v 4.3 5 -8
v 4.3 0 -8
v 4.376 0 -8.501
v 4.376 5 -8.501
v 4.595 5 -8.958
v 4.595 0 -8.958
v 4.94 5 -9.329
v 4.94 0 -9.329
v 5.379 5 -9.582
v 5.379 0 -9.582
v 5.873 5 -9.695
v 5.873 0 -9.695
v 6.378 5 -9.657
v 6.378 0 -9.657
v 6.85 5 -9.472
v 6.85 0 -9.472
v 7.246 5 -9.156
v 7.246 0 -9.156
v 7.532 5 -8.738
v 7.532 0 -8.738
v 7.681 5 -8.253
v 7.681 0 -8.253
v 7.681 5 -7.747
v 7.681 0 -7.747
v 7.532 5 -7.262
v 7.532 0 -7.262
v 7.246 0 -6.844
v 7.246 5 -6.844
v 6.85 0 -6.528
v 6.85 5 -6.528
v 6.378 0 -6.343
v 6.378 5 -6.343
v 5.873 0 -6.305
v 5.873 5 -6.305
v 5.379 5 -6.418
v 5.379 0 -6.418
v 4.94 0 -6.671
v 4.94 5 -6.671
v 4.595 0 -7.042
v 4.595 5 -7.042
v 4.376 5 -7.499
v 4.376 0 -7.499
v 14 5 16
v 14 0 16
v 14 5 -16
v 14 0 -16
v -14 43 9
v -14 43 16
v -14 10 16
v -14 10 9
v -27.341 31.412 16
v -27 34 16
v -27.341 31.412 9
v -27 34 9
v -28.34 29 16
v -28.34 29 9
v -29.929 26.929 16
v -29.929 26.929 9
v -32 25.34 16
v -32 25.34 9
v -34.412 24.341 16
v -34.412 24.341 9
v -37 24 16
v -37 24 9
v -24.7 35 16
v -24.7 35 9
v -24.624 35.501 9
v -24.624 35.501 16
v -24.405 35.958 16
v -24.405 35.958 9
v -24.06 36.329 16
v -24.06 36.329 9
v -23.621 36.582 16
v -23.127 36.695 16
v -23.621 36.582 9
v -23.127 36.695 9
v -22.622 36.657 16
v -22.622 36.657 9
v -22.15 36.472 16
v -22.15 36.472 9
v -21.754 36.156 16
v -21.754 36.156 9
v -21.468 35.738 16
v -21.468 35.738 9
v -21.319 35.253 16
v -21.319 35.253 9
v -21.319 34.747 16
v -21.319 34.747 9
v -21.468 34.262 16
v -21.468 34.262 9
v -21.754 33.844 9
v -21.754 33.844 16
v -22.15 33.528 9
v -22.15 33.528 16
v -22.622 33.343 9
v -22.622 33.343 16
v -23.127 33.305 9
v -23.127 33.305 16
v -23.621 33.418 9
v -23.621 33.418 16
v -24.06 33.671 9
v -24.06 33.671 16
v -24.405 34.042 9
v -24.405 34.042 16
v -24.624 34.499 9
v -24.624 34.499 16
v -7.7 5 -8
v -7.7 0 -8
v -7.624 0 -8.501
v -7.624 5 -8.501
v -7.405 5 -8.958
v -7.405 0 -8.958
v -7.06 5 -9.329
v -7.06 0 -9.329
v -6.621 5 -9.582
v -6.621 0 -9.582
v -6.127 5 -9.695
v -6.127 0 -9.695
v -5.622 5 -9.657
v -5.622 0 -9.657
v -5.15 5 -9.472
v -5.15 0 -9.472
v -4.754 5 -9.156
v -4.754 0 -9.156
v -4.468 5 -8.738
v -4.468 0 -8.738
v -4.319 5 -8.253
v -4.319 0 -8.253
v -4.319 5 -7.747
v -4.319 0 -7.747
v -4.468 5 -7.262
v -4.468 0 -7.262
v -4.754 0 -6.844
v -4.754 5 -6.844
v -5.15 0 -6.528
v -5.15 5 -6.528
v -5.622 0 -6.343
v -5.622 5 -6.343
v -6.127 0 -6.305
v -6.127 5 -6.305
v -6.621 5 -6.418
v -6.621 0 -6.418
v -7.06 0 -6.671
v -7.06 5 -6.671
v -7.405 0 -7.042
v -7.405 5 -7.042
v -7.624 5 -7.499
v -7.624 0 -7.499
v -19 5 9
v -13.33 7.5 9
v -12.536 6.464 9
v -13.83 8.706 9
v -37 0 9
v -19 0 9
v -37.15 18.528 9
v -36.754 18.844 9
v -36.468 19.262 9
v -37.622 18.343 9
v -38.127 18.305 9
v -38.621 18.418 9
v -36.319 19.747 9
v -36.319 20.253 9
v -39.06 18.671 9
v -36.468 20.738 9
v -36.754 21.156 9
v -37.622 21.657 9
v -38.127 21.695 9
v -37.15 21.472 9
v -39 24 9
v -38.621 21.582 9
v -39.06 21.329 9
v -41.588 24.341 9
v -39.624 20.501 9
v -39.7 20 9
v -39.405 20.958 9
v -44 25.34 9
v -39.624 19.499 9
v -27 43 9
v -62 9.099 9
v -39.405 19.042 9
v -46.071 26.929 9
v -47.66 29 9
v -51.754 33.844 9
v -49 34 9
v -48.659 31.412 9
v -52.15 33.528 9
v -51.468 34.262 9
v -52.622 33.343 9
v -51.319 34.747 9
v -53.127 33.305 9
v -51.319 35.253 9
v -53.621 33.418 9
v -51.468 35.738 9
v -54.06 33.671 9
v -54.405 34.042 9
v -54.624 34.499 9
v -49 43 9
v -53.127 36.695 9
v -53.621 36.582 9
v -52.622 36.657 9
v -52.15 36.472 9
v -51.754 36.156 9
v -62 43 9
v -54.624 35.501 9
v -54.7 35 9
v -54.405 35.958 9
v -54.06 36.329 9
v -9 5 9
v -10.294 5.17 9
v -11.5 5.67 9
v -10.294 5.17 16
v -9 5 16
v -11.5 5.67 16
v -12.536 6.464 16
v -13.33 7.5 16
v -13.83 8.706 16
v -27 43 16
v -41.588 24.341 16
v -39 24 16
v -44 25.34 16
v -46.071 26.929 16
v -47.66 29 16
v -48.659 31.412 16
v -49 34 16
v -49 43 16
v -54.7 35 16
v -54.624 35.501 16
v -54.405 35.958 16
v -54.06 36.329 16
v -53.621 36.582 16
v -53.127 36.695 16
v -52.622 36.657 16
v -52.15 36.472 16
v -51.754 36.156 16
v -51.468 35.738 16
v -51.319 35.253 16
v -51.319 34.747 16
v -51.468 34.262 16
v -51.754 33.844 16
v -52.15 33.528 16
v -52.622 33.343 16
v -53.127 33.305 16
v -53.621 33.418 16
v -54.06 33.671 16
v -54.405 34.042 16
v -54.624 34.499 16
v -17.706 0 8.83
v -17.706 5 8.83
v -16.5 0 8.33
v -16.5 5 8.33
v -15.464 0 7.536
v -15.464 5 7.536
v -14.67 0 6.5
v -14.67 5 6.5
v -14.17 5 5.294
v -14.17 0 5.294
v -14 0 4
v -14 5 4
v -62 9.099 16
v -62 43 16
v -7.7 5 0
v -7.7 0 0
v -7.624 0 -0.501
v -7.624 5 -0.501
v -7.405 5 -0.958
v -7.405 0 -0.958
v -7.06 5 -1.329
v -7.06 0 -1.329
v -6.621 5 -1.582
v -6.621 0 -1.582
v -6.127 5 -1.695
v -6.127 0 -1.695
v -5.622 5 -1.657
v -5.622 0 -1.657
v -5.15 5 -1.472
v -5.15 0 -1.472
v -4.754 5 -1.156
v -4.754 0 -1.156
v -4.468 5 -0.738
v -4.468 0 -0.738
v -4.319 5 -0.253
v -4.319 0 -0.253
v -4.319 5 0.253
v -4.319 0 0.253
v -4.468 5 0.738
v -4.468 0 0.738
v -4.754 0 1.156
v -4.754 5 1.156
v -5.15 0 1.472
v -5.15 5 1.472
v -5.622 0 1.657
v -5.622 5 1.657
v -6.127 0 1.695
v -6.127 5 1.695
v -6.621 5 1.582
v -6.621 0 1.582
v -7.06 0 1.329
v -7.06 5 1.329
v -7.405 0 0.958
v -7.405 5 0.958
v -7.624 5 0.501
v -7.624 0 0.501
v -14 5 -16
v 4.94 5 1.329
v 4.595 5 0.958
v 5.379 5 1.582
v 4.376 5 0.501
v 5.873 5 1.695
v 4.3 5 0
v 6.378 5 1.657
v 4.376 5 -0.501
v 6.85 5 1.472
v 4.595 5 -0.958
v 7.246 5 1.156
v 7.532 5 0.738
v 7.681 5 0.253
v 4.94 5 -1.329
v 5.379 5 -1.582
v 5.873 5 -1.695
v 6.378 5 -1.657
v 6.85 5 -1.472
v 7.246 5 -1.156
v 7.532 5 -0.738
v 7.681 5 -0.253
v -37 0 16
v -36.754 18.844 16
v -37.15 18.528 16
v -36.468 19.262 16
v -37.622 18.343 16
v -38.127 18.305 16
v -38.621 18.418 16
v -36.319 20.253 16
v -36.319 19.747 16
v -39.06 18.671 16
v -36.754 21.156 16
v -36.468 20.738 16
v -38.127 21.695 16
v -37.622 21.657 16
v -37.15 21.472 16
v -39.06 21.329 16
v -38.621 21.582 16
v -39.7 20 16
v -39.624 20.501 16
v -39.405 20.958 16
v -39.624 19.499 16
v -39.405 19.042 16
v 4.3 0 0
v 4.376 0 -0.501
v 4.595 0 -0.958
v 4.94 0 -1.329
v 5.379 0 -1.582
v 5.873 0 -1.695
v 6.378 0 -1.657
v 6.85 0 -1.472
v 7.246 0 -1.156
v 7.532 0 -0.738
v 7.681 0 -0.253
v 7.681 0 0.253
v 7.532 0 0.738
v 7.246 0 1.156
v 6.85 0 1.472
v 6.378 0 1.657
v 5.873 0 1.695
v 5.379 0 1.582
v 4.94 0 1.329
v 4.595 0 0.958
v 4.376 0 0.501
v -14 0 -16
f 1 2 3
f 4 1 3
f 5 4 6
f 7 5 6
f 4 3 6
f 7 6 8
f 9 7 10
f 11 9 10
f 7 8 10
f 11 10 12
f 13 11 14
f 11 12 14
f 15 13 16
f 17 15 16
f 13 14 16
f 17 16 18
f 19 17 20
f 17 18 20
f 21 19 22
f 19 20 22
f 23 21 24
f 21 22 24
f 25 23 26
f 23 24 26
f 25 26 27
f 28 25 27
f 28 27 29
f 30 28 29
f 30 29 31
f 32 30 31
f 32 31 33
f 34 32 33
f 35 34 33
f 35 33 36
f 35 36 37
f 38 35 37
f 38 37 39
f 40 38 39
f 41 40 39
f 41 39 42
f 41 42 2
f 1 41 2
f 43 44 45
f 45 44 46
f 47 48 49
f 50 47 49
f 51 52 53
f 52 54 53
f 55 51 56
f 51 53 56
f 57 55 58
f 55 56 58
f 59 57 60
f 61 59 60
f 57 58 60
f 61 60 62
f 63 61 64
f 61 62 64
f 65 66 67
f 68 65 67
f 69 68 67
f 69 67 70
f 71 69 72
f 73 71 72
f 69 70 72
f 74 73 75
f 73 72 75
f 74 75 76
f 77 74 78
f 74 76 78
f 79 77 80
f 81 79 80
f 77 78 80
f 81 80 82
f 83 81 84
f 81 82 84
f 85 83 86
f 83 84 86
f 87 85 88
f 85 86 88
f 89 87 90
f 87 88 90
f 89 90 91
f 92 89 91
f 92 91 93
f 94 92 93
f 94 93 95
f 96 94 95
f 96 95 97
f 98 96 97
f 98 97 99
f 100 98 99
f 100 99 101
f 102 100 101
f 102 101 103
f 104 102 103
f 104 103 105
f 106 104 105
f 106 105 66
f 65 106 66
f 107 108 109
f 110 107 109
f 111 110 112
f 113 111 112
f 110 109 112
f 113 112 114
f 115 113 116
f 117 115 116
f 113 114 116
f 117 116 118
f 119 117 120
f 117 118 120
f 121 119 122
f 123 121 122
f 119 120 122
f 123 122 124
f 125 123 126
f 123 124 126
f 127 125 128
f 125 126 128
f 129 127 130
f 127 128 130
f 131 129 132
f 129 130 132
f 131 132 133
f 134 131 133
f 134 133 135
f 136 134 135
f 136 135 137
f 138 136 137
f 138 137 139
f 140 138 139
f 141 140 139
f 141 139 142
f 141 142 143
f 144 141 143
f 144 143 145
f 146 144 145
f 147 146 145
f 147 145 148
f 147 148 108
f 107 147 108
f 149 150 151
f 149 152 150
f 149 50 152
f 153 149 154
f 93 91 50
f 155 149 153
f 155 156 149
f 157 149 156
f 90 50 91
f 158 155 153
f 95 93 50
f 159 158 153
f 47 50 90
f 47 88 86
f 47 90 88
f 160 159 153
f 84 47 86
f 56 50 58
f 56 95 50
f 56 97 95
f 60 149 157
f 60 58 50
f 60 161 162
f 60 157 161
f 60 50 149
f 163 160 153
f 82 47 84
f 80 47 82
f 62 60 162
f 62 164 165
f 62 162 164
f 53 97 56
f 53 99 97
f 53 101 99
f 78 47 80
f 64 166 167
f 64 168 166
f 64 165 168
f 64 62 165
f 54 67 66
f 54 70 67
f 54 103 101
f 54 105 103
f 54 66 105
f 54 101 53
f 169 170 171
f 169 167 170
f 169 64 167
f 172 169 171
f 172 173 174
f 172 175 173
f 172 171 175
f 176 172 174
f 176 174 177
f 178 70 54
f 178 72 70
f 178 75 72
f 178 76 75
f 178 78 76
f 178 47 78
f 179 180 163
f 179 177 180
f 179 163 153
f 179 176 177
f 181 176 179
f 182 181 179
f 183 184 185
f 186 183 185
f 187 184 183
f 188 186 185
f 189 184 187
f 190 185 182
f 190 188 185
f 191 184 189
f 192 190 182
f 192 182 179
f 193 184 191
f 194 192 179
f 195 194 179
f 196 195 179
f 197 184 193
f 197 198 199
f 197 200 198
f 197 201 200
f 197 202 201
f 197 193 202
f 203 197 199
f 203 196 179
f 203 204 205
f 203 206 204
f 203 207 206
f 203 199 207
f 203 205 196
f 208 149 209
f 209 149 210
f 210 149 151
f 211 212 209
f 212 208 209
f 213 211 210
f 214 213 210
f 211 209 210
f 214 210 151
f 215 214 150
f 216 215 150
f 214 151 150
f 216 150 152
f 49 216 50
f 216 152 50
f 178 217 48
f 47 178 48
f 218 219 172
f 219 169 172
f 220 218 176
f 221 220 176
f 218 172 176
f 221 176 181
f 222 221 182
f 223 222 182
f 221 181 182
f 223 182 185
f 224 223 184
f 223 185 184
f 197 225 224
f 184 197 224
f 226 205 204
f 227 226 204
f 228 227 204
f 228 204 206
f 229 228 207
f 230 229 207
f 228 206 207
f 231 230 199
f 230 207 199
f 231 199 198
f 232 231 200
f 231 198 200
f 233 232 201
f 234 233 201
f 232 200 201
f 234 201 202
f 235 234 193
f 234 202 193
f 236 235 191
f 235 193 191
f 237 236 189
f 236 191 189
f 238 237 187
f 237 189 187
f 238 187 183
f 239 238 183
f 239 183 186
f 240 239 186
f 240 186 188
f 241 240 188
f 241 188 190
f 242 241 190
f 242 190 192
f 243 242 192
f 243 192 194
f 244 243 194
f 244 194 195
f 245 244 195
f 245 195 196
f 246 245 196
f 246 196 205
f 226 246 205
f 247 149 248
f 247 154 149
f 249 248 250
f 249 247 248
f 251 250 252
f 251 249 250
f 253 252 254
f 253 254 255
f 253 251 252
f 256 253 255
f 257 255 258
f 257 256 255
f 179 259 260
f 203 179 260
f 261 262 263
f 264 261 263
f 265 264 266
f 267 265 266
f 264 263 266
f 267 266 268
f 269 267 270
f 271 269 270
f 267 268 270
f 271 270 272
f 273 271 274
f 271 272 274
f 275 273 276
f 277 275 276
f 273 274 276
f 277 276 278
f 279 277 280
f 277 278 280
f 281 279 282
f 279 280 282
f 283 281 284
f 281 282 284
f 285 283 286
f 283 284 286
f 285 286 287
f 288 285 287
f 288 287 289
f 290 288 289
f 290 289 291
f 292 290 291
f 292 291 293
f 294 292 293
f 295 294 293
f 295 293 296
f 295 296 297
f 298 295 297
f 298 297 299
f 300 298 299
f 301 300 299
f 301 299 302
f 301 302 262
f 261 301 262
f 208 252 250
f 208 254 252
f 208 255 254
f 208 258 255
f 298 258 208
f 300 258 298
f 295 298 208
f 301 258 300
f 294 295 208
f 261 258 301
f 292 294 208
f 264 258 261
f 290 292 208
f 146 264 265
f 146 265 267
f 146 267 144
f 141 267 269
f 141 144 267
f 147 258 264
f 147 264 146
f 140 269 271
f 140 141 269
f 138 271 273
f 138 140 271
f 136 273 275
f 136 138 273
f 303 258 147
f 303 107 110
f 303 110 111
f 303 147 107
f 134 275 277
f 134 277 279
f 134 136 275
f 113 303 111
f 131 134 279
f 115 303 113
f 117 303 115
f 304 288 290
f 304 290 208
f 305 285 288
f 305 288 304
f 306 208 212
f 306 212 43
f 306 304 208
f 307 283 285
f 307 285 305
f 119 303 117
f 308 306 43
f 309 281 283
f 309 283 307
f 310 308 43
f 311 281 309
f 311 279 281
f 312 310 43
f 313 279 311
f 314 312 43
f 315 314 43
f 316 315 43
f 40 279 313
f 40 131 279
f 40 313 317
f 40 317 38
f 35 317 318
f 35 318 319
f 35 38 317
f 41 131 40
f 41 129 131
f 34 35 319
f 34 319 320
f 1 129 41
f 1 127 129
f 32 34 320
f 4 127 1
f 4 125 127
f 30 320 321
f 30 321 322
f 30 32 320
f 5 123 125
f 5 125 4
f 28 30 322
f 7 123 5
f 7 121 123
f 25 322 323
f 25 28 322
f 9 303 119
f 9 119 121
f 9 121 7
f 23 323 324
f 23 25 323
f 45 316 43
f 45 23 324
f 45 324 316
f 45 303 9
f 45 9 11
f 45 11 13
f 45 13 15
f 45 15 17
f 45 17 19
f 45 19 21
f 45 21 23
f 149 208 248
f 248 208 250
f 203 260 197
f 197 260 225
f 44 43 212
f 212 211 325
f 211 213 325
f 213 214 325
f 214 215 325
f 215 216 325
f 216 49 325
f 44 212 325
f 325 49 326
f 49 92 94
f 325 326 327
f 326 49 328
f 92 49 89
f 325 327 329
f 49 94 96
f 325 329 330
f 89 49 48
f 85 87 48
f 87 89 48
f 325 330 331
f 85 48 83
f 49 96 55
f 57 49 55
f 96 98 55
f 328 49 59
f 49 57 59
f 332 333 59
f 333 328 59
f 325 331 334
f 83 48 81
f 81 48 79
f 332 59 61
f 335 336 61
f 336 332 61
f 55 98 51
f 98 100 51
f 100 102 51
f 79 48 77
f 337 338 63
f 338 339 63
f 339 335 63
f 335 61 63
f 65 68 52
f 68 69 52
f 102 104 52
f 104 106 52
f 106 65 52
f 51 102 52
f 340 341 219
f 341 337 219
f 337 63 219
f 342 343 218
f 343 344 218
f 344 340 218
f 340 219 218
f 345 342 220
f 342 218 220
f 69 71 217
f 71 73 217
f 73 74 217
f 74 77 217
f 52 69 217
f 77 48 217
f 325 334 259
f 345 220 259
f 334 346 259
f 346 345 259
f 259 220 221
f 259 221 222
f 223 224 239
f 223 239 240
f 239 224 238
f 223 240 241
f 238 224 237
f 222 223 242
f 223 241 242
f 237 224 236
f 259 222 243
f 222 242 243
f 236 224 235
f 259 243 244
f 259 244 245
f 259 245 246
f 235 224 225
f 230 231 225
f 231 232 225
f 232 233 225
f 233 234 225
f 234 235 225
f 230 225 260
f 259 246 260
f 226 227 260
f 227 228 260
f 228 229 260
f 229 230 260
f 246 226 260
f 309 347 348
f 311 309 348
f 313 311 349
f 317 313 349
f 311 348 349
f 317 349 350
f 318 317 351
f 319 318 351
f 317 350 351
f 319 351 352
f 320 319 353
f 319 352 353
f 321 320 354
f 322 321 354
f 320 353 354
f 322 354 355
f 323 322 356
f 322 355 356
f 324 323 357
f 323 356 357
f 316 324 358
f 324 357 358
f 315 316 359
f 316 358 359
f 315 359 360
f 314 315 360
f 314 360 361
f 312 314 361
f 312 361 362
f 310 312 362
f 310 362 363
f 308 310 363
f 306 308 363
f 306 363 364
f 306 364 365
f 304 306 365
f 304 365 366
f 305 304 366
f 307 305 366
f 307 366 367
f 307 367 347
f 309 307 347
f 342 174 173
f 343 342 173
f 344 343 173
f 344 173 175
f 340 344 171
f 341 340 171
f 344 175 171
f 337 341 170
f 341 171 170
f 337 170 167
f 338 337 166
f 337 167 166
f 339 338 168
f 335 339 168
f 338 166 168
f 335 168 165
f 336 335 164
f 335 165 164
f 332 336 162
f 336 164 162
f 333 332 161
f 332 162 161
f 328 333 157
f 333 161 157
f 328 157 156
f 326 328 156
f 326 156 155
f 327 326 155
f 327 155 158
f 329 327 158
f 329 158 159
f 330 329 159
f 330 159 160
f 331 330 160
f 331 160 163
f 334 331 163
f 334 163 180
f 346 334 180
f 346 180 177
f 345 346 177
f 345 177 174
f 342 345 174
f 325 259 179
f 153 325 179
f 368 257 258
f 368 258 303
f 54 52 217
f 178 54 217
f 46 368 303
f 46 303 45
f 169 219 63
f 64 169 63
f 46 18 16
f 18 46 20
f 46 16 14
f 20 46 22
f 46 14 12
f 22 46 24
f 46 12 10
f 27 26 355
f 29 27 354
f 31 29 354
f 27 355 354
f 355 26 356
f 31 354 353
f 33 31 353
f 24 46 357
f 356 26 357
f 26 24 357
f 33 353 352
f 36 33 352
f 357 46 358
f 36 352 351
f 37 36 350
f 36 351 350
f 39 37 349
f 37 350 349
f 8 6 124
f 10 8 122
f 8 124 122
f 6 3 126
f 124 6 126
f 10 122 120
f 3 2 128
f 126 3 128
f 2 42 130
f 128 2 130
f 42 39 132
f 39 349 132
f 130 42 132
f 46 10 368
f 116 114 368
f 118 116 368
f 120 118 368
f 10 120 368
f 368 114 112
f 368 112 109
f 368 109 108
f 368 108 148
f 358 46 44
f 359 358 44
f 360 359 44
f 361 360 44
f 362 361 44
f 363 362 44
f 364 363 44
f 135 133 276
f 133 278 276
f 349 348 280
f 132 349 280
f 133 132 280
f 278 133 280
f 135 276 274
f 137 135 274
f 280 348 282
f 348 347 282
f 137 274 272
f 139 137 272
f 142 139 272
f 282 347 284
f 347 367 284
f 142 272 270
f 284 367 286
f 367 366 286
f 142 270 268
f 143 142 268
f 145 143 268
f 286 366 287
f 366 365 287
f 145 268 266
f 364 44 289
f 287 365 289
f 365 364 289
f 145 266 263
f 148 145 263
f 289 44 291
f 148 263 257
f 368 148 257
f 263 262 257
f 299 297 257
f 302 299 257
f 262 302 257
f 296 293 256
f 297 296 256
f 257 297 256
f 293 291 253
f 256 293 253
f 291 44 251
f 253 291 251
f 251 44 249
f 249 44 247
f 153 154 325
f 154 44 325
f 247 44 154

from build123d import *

# Parameters (mm, degrees)
SKETCH1_W            = 28
SKETCH1_H            = 32
BOSS_EXTRUDE1_DEPTH  = 5
M3_CLEARANCE_HOLE1_D = 3.4
BOSS_EXTRUDE2_DEPTH  = 7
FILLET1_R            = 10
FILLET2_R            = 5
FILLET3_R            = 5
M3_CLEARANCE_HOLE2_D = 3.4
CHAMFER1_SIZE        = 25
CHAMFER1_SIZE2       = 9.099255857


with BuildPart() as part:
    # Sketch1 → Boss-Extrude1 (new body)
    with BuildSketch(Plane(origin=(0, 0, 0), x_dir=(1, 0, 0), z_dir=(0, 1, 0))):
        Rectangle(SKETCH1_W, SKETCH1_H)
    extrude(amount=BOSS_EXTRUDE1_DEPTH)

    # M3 Clearance Hole1 (through all)
    with Locations(Plane(origin=(0, 5, 0), x_dir=(1, 0, 0), z_dir=(0, 1, 0))):
        with Locations((-6, 8), (6, 8), (6, 0), (-6, 0)):
            Hole(M3_CLEARANCE_HOLE1_D / 2)

    # Sketch5 → Boss-Extrude2 (add)
    with BuildSketch(Plane.XY.offset(16)):
        Polygon((-14, 0), (-62, 0), (-62, 43), (-49, 43), (-49, 24), (-27, 24), (-27, 43), (-14, 43), align=None)
    extrude(amount=-BOSS_EXTRUDE2_DEPTH)

    # Fillet1
    fillet1_edges = [part.edges().sort_by_distance(p)[0] for p in [
        (-49, 24, 12.5),
        (-27, 24, 12.5),
    ]]
    fillet(fillet1_edges, radius=FILLET1_R)

    # Fillet2
    fillet2_edges = [part.edges().sort_by_distance(p)[0] for p in [
        (-14, 5, 12.5),
    ]]
    fillet(fillet2_edges, radius=FILLET2_R)

    # Fillet3
    fillet3_edges = [part.edges().sort_by_distance(p)[0] for p in [
        (-14, 2.5, 9),
    ]]
    fillet(fillet3_edges, radius=FILLET3_R)

    # M3 Clearance Hole2 (through all)
    with Locations(Plane.XY.offset(16)):
        with Locations((-53, 35), (-23, 35), (-38, 20)):
            Hole(M3_CLEARANCE_HOLE2_D / 2)

    # Chamfer1
    chamfer1_edges = [part.edges().sort_by_distance(p)[0] for p in [
        (-62, 0, 12.5),
    ]]
    chamfer1_side = [part.faces().sort_by_distance(p)[0] for p in [
        (-10.698240226, 0, 3.653109537),
    ]]
    chamfer(chamfer1_edges, length=CHAMFER1_SIZE, length2=CHAMFER1_SIZE2, reference=chamfer1_side[0])


solid = part.part
